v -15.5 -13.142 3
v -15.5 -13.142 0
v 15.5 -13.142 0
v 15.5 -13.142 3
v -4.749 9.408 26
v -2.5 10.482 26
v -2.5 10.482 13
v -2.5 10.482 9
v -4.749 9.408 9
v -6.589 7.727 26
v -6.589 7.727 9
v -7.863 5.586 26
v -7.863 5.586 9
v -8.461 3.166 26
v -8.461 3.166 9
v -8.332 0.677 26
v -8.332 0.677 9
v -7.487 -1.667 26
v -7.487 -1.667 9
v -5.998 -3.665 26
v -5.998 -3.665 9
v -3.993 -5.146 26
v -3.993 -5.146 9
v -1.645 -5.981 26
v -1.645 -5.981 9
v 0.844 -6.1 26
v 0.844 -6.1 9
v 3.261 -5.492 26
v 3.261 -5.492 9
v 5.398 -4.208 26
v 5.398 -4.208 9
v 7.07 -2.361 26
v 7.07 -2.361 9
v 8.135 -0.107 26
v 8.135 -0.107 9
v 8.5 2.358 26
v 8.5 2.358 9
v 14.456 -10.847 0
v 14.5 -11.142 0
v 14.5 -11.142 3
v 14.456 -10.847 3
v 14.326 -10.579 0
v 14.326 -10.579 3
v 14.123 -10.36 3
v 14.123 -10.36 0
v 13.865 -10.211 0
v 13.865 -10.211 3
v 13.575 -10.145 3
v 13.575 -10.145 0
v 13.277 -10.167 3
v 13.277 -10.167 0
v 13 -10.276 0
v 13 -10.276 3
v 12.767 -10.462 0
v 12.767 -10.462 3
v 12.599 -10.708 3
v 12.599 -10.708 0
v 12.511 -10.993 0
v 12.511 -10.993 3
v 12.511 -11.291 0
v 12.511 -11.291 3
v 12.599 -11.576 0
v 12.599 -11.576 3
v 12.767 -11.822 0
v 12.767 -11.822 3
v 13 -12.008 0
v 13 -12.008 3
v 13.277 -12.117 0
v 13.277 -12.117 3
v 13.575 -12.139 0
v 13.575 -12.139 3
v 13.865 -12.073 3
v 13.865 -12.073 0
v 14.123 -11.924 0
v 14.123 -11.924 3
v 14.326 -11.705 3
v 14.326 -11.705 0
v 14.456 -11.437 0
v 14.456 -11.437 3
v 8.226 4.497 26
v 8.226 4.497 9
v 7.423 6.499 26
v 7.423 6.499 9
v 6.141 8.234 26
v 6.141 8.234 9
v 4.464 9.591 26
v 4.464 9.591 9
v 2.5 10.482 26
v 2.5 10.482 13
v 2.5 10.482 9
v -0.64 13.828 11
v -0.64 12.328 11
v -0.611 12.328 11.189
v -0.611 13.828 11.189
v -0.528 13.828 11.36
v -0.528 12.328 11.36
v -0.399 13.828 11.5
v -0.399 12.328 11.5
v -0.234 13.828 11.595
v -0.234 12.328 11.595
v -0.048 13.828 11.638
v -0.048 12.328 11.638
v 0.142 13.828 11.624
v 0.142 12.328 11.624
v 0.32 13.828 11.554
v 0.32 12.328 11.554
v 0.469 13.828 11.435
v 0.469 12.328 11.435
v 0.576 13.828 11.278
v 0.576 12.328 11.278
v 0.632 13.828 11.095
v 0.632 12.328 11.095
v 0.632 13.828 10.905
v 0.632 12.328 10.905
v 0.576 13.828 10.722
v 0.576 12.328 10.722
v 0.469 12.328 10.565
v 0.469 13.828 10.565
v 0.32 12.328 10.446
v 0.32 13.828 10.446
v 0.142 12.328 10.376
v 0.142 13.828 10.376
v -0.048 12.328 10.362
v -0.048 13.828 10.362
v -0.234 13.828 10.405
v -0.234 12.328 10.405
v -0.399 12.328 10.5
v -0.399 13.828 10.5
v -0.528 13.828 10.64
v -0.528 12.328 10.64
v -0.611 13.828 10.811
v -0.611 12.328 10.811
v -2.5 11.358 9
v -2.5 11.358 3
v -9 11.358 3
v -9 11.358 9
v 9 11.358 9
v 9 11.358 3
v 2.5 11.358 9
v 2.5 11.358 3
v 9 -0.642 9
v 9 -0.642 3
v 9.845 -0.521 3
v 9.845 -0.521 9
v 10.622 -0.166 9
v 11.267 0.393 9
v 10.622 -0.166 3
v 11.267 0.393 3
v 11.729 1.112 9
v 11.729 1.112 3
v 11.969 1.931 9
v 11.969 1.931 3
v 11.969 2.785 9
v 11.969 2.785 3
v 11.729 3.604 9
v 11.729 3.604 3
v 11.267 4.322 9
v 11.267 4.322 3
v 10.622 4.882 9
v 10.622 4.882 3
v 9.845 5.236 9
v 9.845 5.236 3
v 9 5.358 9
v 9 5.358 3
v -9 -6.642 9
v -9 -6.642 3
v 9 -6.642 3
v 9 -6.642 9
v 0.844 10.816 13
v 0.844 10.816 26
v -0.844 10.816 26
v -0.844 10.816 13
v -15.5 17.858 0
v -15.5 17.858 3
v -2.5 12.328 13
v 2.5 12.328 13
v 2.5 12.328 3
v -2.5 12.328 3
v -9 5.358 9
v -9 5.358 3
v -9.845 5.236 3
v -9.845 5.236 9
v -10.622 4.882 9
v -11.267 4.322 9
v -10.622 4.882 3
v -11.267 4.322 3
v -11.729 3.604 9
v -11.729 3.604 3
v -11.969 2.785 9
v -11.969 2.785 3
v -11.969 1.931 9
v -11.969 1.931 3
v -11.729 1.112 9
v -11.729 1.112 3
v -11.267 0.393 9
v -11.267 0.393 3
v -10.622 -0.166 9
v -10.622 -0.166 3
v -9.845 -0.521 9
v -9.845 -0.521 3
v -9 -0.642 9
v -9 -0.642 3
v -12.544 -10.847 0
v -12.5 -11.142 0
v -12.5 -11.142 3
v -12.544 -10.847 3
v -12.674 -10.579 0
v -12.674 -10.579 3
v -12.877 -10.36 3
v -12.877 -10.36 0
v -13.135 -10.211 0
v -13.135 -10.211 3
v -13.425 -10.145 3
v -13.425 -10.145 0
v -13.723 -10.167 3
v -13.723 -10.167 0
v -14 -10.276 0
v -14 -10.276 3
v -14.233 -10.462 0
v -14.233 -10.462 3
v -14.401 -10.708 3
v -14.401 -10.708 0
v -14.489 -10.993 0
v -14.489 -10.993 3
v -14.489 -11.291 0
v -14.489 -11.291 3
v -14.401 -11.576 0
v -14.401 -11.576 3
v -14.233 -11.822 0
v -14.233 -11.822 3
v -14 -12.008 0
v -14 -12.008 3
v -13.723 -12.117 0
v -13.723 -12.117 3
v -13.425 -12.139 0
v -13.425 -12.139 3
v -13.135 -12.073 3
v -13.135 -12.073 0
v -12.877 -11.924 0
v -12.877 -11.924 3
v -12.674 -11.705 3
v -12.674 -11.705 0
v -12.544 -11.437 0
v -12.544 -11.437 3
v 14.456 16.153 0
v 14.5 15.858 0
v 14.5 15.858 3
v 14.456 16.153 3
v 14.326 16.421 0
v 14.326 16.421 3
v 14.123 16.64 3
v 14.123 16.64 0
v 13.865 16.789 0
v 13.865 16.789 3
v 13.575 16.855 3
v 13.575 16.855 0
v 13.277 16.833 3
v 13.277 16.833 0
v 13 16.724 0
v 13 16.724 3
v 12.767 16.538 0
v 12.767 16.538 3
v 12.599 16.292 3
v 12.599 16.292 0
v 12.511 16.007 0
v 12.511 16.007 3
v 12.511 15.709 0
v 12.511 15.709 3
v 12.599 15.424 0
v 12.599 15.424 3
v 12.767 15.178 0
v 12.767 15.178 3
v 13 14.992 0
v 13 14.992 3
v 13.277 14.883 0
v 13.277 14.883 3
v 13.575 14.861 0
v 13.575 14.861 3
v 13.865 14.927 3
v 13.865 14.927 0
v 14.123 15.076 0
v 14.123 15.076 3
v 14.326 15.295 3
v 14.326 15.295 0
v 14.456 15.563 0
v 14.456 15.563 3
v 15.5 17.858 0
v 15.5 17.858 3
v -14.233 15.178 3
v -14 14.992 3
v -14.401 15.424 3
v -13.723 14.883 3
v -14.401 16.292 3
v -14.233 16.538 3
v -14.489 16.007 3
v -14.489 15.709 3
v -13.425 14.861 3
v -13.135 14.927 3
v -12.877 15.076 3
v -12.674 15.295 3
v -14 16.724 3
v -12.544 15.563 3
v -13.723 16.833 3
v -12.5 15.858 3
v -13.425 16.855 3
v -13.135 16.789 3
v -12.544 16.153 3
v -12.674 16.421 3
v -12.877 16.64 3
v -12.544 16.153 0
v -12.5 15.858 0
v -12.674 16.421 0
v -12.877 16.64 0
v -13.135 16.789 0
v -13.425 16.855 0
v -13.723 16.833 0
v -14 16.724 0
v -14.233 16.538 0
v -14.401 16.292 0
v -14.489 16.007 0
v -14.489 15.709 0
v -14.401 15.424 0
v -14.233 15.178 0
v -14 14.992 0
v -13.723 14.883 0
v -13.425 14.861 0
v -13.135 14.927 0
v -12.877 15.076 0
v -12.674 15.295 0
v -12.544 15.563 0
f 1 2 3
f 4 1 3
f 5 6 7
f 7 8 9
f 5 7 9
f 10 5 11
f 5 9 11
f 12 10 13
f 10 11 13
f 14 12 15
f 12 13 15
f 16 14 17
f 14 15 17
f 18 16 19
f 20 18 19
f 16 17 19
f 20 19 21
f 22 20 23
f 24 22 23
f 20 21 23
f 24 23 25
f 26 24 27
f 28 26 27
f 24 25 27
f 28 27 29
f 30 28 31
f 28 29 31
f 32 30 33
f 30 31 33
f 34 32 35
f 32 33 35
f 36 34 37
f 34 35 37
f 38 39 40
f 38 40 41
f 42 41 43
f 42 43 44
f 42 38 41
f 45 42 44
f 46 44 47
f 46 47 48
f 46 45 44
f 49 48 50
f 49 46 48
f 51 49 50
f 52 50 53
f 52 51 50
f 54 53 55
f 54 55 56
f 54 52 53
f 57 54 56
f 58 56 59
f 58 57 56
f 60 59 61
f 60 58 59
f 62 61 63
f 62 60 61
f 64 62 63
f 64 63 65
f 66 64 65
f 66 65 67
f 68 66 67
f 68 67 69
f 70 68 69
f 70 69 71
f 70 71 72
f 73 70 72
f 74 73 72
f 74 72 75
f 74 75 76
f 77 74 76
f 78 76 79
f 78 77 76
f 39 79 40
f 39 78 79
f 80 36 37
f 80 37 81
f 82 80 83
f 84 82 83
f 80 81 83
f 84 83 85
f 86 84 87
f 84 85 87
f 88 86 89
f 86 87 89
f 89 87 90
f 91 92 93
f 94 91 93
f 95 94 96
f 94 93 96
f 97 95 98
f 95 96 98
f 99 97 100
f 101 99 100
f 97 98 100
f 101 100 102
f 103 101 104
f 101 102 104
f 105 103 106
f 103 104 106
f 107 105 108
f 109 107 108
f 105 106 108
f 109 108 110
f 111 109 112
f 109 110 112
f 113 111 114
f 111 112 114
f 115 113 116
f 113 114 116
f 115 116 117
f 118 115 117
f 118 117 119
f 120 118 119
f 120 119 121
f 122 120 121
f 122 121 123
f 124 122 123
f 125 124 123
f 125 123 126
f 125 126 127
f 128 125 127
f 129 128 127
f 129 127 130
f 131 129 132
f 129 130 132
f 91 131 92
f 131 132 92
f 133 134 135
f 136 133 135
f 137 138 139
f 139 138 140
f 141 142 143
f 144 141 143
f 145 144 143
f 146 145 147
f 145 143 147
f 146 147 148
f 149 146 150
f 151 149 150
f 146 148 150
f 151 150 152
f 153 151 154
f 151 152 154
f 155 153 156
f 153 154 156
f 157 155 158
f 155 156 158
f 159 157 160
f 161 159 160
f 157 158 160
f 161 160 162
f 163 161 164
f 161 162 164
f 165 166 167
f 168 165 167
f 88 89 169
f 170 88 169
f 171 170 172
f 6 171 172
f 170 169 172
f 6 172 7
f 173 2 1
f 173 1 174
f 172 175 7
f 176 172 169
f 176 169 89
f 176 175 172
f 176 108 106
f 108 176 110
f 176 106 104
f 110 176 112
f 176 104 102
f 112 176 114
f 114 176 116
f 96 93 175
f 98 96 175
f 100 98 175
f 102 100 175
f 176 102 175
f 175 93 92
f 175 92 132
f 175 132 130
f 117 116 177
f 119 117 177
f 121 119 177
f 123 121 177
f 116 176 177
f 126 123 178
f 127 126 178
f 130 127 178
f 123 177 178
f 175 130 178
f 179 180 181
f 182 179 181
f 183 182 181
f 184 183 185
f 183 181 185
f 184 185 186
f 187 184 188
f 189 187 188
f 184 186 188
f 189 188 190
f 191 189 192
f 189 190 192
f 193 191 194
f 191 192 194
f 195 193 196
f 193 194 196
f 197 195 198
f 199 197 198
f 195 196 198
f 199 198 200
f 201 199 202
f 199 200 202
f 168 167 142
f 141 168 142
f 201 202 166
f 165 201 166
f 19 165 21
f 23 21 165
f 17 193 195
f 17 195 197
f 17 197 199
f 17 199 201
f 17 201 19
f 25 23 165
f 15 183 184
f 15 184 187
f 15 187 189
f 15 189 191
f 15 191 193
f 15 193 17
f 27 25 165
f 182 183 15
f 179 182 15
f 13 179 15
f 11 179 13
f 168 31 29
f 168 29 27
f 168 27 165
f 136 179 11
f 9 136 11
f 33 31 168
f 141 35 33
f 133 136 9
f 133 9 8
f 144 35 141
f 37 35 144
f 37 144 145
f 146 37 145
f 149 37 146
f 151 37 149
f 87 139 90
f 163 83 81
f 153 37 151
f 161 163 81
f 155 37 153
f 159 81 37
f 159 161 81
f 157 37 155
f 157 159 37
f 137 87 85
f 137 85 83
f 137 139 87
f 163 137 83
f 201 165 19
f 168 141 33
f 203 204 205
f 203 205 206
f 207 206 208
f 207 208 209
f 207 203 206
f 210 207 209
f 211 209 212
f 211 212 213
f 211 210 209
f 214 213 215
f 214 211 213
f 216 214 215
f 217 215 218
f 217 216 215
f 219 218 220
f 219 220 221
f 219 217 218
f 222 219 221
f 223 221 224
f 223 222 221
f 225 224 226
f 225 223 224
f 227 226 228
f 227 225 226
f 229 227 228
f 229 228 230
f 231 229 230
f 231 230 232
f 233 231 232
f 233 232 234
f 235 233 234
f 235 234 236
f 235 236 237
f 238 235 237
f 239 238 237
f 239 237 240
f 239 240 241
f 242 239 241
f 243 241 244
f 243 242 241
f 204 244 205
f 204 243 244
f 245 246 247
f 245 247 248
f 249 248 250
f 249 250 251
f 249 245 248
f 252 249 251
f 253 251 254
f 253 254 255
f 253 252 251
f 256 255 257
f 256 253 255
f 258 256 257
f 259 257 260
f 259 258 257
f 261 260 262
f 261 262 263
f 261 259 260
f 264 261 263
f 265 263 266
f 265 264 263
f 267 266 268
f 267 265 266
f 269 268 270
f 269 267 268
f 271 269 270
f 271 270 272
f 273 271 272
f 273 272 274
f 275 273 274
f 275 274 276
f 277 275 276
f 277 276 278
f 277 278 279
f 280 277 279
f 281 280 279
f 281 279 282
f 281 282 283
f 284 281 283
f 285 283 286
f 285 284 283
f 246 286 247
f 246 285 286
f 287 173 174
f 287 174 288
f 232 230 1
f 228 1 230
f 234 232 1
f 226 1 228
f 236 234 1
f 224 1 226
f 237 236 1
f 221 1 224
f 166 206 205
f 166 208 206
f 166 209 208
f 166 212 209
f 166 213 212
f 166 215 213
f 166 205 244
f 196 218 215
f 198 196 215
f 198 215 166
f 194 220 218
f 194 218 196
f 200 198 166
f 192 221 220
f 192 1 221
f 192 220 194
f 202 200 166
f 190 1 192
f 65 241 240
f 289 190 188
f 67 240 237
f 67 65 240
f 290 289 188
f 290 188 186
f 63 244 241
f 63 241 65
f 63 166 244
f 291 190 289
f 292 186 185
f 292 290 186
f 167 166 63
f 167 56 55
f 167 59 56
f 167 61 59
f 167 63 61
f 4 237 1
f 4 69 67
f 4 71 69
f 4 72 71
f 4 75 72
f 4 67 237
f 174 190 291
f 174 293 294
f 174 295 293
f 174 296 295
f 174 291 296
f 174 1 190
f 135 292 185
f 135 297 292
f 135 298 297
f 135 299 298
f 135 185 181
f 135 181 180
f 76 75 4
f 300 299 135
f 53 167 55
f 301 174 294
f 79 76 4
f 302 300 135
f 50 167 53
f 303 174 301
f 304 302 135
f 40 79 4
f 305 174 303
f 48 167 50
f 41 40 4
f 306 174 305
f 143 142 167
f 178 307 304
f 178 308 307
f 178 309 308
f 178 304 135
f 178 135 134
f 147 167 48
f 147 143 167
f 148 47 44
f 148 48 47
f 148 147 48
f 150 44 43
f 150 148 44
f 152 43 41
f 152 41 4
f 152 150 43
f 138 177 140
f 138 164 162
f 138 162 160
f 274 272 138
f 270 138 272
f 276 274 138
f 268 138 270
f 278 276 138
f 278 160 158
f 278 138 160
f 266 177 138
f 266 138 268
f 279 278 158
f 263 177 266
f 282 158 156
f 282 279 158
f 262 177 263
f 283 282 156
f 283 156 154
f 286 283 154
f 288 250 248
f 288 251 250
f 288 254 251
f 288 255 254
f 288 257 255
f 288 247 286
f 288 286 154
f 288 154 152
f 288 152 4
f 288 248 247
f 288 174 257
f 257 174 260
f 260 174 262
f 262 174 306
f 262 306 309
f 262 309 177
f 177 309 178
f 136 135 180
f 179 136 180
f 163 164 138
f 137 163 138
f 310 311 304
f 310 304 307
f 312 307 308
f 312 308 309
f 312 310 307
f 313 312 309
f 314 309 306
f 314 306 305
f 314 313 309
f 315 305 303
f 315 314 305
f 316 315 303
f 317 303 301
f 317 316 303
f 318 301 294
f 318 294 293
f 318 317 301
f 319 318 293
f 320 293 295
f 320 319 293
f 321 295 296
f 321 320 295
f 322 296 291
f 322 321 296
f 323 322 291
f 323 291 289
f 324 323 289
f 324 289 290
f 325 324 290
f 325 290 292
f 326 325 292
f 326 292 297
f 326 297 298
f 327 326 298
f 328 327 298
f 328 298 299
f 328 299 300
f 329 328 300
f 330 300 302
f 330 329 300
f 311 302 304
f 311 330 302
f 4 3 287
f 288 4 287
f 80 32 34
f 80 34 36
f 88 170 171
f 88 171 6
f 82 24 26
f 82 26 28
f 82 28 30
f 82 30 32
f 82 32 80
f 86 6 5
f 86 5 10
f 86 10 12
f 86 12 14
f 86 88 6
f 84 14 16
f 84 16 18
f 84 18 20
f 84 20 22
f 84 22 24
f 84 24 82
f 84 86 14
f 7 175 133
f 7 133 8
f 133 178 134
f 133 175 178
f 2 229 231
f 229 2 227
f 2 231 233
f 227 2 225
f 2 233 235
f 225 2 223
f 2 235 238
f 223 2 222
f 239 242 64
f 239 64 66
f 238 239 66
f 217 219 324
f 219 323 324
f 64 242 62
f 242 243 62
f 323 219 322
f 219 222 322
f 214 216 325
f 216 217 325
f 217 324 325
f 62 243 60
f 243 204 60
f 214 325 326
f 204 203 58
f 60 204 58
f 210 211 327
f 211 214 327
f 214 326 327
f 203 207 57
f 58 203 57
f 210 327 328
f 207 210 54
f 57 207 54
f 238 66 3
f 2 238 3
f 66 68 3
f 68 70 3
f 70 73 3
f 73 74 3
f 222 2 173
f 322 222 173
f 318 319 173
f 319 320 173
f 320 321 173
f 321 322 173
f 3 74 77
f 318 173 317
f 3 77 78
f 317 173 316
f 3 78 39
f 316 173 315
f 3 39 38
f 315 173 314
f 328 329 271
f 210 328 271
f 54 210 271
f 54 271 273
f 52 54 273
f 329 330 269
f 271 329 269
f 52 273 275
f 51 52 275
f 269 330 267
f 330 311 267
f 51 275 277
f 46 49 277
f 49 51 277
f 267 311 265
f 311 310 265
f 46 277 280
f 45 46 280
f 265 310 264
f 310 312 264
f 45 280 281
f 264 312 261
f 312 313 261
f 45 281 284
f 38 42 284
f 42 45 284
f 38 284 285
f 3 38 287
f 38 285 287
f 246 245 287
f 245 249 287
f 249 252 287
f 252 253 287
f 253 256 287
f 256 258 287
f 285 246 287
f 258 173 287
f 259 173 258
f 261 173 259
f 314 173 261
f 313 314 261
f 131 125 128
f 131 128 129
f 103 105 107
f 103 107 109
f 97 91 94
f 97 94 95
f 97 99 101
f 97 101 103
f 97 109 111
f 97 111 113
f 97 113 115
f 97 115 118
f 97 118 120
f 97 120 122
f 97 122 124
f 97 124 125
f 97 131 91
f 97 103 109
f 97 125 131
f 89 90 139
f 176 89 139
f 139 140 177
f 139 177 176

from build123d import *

# Parameters (mm, degrees)
F0_W     = 31
F0_H     = 31
F0_R     = 1
F1_DEPTH = 3
F2_DEPTH = 26
F3_DEPTH = 9
F4_DEPTH = 13
F5_R     = 0.639581
F6_DEPTH = 1.5


with BuildPart() as f1:
    # F0 (on Top) → F1 (new body)
    with BuildSketch(Plane.XY):
        with Locations((0, 2.357912)):
            Rectangle(F0_W, F0_H)
        with Locations((-13.5, -11.142088)):
            Circle(F0_R, mode=Mode.SUBTRACT)
        with Locations((13.5, -11.142088)):
            Circle(F0_R, mode=Mode.SUBTRACT)
        with Locations((-13.5, 15.857912)):
            Circle(F0_R, mode=Mode.SUBTRACT)
        with BuildLine():
            Line((2.5, 11.357912), (9, 11.357912))
            Line((9, 11.357912), (9, 5.357912))
            ThreePointArc((9, 5.357912), (12, 2.357912), (9, -0.642088))
            Line((9, -0.642088), (9, -6.642088))
            Line((9, -6.642088), (-9, -6.642088))
            Line((-9, -6.642088), (-9, -0.642088))
            ThreePointArc((-9, -0.642088), (-12, 2.357912), (-9, 5.357912))
            Line((-9, 5.357912), (-9, 11.357912))
            Line((-9, 11.357912), (-2.5, 11.357912))
            Line((-2.5, 11.357912), (-2.5, 12.327521))
            Line((-2.5, 12.327521), (2.5, 12.327521))
            Line((2.5, 12.327521), (2.5, 11.357912))
        make_face(mode=Mode.SUBTRACT)
        with Locations((13.5, 15.857912)):
            Circle(F0_R, mode=Mode.SUBTRACT)
    extrude(amount=F1_DEPTH)



with BuildPart() as f2:
    # F0 (on Top) → F2 (new body)
    with BuildSketch(Plane.XY):
        with BuildLine():
            ThreePointArc((8.5, 2.357912), (6.837397, 7.407664), (2.5, 10.48195))
            ThreePointArc((2.5, 10.48195), (0, 10.857912), (-2.5, 10.48195))
            ThreePointArc((-2.5, 10.48195), (-5.049752, -4.479485), (8.5, 2.357912))
        make_face()
    extrude(amount=F2_DEPTH)


with BuildPart() as f1_1:
    add(f1.part)

    add(f2.part)  # F3 merges F2
    # F0 (on Top) → F3 (join)
    with BuildSketch(Plane.XY):
        with BuildLine():
            Line((9, 5.357912), (9, 11.357912))
            Line((9, 11.357912), (2.5, 11.357912))
            Line((2.5, 11.357912), (2.5, 10.48195))
            ThreePointArc((2.5, 10.48195), (6.837397, 7.407664), (8.5, 2.357912))
            ThreePointArc((8.5, 2.357912), (-5.049752, -4.479485), (-2.5, 10.48195))
            Line((-2.5, 10.48195), (-2.5, 11.357912))
            Line((-2.5, 11.357912), (-9, 11.357912))
            Line((-9, 11.357912), (-9, 5.357912))
            ThreePointArc((-9, 5.357912), (-12, 2.357912), (-9, -0.642088))
            Line((-9, -0.642088), (-9, -6.642088))
            Line((-9, -6.642088), (9, -6.642088))
            Line((9, -6.642088), (9, -0.642088))
            ThreePointArc((9, -0.642088), (12, 2.357912), (9, 5.357912))
        make_face()
    extrude(amount=F3_DEPTH)

    # F0 (on Top) → F4 (join)
    with BuildSketch(Plane.XY):
        with BuildLine():
            Line((2.5, 10.48195), (2.5, 11.357912))
            Line((2.5, 11.357912), (2.5, 12.327521))
            Line((2.5, 12.327521), (-2.5, 12.327521))
            Line((-2.5, 12.327521), (-2.5, 11.357912))
            Line((-2.5, 11.357912), (-2.5, 10.48195))
            ThreePointArc((-2.5, 10.48195), (0, 10.857912), (2.5, 10.48195))
        make_face()
    extrude(amount=F4_DEPTH)

    # F5 (on face) → F6 (join)
    with BuildSketch(Plane(origin=(0, 12.327521, 0), x_dir=(-1, 0, 0), z_dir=(0, 1, 0))):
        with Locations((0, 11)):
            Circle(F5_R)
    extrude(amount=F6_DEPTH)


with BuildPart() as f7_1:
    # F7: copy of F1
    add(f1_1.part)


solid = f1_1.part
